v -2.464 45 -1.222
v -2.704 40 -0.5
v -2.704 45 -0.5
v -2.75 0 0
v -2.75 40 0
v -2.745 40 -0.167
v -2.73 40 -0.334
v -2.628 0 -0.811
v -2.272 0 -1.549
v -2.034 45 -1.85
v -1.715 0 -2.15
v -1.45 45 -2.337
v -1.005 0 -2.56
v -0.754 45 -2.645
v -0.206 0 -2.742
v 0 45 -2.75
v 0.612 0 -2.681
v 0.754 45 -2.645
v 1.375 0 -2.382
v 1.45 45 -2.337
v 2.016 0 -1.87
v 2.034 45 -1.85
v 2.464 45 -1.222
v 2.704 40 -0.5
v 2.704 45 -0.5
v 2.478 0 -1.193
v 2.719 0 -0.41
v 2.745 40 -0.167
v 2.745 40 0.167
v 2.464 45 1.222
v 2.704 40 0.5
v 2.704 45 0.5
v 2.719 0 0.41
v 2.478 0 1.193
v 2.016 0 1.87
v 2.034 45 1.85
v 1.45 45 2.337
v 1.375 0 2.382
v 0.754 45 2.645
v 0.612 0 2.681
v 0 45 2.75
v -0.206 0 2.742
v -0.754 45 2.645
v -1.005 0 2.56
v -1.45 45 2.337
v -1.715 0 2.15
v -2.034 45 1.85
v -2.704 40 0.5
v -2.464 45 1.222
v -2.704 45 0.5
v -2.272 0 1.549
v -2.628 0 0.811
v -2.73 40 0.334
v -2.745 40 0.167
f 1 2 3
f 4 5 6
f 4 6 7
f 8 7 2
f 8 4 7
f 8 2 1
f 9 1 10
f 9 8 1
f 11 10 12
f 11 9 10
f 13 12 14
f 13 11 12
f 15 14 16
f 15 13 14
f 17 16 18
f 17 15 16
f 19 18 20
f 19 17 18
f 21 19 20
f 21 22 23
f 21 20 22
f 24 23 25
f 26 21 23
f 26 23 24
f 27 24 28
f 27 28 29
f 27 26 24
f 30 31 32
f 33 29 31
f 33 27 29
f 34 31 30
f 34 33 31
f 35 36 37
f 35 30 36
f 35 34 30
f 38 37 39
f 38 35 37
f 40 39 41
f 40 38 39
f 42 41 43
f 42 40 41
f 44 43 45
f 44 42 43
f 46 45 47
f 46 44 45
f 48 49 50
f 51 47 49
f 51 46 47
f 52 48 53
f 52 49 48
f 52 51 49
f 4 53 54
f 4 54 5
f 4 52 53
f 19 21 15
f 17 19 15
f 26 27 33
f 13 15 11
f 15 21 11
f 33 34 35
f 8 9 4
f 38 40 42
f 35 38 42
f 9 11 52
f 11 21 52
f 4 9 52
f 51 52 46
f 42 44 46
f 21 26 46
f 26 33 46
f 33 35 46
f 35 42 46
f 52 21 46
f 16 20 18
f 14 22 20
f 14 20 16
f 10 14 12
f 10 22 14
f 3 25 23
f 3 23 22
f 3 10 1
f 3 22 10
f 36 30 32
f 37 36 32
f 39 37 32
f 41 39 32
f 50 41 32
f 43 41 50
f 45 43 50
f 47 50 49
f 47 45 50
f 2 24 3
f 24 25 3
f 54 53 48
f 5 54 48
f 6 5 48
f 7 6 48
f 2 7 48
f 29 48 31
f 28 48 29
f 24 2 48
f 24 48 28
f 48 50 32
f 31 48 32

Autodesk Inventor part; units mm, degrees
ref_plane "YZ Plane" through (0, 0, 0) normal (1, 0, 0) x (0, 1, 0)
ref_plane "XZ Plane" through (0, 0, 0) normal (0, 1, 0) x (-1, 0, 0)
ref_plane "XY Plane" through (0, 0, 0) normal (0, 0, 1) x (1, 0, 0)
sketch "Sketch1" plane through (0, 0, 0) normal (0, 1, 0) x (-1, 0, 0)
  circle A0 centre (0, 0) radius 2.75
  dimension "d0" = 5.5
extrude "Extrusion1" add sketch "Sketch1" along normal blind 45
sketch "Sketch2" plane through (0, 45, 0) normal (0, 1, 0) x (1, 0, 0)
  line L0 (3.6897, -0.5) -> (3.6897, 0.5)
  line L1 (3.6897, 0.5) -> (-3.6897, 0.5)
  line L2 (-3.6897, 0.5) -> (-3.6897, -0.5)
  line L3 (-3.6897, -0.5) -> (3.6897, -0.5)
  line L4 (3.6897, -0.5) -> (-3.6897, 0.5) construction
  line L5 (3.6897, 0.5) -> (-3.6897, -0.5) construction
  point P0 (0, 0)
  dimension "d3" = 1
extrude "Extrusion2" cut sketch "Sketch2" against normal blind 5
properties part number "Solenoid Interior"
